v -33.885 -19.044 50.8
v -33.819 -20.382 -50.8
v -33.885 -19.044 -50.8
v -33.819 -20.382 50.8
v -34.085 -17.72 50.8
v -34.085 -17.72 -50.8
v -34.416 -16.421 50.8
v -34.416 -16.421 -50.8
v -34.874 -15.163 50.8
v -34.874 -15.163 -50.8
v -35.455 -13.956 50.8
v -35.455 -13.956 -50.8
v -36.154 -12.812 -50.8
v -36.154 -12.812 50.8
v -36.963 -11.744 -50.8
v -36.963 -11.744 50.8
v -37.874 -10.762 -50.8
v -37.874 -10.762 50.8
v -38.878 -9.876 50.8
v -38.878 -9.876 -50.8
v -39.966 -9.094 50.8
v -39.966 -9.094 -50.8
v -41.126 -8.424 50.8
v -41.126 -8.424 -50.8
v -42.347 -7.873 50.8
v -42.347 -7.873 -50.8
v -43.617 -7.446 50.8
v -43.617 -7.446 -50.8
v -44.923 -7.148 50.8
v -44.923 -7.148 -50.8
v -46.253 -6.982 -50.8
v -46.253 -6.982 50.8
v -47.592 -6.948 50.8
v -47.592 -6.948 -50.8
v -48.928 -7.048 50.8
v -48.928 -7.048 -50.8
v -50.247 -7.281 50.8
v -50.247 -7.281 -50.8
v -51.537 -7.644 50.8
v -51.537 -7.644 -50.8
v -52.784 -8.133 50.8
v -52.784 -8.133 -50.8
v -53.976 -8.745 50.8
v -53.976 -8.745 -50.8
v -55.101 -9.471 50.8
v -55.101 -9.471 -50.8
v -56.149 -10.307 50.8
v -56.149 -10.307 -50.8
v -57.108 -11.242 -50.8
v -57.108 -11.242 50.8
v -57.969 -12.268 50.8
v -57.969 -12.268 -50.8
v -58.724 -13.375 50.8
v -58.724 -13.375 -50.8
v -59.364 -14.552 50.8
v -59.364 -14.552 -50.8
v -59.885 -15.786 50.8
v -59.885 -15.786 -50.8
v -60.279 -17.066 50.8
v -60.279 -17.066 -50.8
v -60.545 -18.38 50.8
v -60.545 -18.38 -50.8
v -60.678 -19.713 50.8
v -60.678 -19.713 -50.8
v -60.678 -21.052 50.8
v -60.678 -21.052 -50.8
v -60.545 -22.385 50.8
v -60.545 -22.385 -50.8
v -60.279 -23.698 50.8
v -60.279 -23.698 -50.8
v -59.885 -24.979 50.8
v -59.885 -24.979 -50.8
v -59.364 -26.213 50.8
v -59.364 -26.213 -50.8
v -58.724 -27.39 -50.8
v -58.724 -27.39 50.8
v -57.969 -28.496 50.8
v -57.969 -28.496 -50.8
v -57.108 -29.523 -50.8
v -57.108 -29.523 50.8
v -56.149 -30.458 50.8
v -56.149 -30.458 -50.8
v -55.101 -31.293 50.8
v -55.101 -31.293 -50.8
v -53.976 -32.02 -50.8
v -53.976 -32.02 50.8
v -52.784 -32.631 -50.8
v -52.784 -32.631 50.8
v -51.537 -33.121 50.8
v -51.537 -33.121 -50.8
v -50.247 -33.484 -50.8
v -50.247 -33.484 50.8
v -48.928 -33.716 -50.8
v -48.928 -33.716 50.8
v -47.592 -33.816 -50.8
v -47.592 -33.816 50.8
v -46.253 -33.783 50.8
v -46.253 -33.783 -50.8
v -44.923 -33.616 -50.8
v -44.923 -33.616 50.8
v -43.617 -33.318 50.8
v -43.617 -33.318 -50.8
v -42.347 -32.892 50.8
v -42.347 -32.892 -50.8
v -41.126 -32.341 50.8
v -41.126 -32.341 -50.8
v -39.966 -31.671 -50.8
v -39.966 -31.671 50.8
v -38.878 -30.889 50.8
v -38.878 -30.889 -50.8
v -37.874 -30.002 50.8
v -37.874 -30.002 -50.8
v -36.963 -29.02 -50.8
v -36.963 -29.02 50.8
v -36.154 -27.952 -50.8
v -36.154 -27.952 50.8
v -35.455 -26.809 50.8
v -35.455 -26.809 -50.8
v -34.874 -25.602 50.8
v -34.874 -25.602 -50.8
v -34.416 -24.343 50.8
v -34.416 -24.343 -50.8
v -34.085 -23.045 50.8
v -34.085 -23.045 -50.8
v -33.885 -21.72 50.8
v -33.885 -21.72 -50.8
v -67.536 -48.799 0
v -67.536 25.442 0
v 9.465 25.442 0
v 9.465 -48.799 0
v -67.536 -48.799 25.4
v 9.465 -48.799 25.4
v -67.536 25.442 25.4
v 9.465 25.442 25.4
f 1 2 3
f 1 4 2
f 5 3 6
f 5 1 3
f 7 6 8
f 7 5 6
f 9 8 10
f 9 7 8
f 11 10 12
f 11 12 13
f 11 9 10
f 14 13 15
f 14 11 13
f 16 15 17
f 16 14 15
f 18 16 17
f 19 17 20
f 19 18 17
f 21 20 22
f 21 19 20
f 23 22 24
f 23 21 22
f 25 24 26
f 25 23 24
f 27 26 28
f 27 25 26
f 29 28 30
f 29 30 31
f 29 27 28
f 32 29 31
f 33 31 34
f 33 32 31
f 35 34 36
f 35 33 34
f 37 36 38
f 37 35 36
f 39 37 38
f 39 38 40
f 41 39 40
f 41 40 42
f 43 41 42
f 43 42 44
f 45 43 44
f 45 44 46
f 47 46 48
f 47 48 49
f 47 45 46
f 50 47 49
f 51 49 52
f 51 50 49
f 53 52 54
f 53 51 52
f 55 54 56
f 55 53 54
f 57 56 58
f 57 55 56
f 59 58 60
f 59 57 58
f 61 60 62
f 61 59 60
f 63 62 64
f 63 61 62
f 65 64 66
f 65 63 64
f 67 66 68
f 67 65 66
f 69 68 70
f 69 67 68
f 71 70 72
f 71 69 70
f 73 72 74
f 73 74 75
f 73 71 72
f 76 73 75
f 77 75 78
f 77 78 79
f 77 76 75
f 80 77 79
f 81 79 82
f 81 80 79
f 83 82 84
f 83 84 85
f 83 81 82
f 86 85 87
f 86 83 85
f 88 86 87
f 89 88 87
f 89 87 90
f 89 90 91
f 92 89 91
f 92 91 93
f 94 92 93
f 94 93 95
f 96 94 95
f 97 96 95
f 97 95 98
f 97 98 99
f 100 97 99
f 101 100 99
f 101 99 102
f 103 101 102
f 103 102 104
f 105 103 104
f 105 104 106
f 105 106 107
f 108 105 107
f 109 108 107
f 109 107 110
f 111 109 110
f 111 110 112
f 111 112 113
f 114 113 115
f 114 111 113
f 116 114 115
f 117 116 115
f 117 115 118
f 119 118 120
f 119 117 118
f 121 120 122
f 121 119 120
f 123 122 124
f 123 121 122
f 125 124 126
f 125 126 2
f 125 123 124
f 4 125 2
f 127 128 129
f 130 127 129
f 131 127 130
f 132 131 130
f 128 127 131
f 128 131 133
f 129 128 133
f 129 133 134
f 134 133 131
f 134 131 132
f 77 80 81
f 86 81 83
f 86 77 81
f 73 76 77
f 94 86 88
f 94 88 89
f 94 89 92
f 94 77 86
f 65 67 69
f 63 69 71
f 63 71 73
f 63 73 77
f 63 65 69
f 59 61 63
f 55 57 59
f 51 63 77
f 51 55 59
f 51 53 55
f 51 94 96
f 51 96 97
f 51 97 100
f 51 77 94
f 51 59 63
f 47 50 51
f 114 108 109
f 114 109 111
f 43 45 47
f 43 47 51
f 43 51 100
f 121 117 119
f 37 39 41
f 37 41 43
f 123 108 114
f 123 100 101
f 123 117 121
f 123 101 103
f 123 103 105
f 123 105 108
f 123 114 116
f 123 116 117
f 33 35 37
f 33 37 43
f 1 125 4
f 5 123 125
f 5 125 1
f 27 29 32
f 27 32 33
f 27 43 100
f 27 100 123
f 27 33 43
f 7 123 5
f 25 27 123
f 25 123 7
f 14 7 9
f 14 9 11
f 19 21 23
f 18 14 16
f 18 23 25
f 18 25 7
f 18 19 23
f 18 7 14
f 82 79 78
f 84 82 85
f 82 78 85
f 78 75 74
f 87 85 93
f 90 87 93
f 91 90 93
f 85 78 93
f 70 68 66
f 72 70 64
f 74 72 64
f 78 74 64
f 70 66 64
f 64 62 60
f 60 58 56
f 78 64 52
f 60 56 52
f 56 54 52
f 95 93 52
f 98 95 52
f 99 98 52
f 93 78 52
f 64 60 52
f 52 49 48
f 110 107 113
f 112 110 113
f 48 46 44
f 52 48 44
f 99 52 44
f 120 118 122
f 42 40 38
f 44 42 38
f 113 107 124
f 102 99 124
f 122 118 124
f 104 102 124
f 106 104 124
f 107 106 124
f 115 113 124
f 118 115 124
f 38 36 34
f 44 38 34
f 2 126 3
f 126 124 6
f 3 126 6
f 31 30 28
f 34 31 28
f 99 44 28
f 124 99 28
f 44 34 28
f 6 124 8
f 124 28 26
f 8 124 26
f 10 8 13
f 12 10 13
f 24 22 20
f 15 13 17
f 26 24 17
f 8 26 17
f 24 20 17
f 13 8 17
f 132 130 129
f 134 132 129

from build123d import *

# Parameters (mm, degrees)
F0_W          = 77.001809
F0_H          = 74.241732
F2_DEPTH      = 25.4
F1_R          = 13.438223
F3_DEPTH      = 50.8
F3_DEPTH_BACK = 50.8


with BuildPart() as f2:
    # F0 (on Top) → F2 (new body)
    with BuildSketch(Plane.XY):
        with Locations((-29.035435, -11.678418)):
            Rectangle(F0_W, F0_H)
    extrude(amount=F2_DEPTH)


with BuildPart() as f3:
    # F1 (on Top) → F3 (new body, two sides)
    with BuildSketch(Plane.XY) as f3_sk:
        with Locations((-47.256798, -20.382388)):
            Circle(F1_R)
    extrude(amount=F3_DEPTH)
    extrude(f3_sk.sketch, amount=-F3_DEPTH_BACK)


solid = Compound([f2.part, f3.part])
